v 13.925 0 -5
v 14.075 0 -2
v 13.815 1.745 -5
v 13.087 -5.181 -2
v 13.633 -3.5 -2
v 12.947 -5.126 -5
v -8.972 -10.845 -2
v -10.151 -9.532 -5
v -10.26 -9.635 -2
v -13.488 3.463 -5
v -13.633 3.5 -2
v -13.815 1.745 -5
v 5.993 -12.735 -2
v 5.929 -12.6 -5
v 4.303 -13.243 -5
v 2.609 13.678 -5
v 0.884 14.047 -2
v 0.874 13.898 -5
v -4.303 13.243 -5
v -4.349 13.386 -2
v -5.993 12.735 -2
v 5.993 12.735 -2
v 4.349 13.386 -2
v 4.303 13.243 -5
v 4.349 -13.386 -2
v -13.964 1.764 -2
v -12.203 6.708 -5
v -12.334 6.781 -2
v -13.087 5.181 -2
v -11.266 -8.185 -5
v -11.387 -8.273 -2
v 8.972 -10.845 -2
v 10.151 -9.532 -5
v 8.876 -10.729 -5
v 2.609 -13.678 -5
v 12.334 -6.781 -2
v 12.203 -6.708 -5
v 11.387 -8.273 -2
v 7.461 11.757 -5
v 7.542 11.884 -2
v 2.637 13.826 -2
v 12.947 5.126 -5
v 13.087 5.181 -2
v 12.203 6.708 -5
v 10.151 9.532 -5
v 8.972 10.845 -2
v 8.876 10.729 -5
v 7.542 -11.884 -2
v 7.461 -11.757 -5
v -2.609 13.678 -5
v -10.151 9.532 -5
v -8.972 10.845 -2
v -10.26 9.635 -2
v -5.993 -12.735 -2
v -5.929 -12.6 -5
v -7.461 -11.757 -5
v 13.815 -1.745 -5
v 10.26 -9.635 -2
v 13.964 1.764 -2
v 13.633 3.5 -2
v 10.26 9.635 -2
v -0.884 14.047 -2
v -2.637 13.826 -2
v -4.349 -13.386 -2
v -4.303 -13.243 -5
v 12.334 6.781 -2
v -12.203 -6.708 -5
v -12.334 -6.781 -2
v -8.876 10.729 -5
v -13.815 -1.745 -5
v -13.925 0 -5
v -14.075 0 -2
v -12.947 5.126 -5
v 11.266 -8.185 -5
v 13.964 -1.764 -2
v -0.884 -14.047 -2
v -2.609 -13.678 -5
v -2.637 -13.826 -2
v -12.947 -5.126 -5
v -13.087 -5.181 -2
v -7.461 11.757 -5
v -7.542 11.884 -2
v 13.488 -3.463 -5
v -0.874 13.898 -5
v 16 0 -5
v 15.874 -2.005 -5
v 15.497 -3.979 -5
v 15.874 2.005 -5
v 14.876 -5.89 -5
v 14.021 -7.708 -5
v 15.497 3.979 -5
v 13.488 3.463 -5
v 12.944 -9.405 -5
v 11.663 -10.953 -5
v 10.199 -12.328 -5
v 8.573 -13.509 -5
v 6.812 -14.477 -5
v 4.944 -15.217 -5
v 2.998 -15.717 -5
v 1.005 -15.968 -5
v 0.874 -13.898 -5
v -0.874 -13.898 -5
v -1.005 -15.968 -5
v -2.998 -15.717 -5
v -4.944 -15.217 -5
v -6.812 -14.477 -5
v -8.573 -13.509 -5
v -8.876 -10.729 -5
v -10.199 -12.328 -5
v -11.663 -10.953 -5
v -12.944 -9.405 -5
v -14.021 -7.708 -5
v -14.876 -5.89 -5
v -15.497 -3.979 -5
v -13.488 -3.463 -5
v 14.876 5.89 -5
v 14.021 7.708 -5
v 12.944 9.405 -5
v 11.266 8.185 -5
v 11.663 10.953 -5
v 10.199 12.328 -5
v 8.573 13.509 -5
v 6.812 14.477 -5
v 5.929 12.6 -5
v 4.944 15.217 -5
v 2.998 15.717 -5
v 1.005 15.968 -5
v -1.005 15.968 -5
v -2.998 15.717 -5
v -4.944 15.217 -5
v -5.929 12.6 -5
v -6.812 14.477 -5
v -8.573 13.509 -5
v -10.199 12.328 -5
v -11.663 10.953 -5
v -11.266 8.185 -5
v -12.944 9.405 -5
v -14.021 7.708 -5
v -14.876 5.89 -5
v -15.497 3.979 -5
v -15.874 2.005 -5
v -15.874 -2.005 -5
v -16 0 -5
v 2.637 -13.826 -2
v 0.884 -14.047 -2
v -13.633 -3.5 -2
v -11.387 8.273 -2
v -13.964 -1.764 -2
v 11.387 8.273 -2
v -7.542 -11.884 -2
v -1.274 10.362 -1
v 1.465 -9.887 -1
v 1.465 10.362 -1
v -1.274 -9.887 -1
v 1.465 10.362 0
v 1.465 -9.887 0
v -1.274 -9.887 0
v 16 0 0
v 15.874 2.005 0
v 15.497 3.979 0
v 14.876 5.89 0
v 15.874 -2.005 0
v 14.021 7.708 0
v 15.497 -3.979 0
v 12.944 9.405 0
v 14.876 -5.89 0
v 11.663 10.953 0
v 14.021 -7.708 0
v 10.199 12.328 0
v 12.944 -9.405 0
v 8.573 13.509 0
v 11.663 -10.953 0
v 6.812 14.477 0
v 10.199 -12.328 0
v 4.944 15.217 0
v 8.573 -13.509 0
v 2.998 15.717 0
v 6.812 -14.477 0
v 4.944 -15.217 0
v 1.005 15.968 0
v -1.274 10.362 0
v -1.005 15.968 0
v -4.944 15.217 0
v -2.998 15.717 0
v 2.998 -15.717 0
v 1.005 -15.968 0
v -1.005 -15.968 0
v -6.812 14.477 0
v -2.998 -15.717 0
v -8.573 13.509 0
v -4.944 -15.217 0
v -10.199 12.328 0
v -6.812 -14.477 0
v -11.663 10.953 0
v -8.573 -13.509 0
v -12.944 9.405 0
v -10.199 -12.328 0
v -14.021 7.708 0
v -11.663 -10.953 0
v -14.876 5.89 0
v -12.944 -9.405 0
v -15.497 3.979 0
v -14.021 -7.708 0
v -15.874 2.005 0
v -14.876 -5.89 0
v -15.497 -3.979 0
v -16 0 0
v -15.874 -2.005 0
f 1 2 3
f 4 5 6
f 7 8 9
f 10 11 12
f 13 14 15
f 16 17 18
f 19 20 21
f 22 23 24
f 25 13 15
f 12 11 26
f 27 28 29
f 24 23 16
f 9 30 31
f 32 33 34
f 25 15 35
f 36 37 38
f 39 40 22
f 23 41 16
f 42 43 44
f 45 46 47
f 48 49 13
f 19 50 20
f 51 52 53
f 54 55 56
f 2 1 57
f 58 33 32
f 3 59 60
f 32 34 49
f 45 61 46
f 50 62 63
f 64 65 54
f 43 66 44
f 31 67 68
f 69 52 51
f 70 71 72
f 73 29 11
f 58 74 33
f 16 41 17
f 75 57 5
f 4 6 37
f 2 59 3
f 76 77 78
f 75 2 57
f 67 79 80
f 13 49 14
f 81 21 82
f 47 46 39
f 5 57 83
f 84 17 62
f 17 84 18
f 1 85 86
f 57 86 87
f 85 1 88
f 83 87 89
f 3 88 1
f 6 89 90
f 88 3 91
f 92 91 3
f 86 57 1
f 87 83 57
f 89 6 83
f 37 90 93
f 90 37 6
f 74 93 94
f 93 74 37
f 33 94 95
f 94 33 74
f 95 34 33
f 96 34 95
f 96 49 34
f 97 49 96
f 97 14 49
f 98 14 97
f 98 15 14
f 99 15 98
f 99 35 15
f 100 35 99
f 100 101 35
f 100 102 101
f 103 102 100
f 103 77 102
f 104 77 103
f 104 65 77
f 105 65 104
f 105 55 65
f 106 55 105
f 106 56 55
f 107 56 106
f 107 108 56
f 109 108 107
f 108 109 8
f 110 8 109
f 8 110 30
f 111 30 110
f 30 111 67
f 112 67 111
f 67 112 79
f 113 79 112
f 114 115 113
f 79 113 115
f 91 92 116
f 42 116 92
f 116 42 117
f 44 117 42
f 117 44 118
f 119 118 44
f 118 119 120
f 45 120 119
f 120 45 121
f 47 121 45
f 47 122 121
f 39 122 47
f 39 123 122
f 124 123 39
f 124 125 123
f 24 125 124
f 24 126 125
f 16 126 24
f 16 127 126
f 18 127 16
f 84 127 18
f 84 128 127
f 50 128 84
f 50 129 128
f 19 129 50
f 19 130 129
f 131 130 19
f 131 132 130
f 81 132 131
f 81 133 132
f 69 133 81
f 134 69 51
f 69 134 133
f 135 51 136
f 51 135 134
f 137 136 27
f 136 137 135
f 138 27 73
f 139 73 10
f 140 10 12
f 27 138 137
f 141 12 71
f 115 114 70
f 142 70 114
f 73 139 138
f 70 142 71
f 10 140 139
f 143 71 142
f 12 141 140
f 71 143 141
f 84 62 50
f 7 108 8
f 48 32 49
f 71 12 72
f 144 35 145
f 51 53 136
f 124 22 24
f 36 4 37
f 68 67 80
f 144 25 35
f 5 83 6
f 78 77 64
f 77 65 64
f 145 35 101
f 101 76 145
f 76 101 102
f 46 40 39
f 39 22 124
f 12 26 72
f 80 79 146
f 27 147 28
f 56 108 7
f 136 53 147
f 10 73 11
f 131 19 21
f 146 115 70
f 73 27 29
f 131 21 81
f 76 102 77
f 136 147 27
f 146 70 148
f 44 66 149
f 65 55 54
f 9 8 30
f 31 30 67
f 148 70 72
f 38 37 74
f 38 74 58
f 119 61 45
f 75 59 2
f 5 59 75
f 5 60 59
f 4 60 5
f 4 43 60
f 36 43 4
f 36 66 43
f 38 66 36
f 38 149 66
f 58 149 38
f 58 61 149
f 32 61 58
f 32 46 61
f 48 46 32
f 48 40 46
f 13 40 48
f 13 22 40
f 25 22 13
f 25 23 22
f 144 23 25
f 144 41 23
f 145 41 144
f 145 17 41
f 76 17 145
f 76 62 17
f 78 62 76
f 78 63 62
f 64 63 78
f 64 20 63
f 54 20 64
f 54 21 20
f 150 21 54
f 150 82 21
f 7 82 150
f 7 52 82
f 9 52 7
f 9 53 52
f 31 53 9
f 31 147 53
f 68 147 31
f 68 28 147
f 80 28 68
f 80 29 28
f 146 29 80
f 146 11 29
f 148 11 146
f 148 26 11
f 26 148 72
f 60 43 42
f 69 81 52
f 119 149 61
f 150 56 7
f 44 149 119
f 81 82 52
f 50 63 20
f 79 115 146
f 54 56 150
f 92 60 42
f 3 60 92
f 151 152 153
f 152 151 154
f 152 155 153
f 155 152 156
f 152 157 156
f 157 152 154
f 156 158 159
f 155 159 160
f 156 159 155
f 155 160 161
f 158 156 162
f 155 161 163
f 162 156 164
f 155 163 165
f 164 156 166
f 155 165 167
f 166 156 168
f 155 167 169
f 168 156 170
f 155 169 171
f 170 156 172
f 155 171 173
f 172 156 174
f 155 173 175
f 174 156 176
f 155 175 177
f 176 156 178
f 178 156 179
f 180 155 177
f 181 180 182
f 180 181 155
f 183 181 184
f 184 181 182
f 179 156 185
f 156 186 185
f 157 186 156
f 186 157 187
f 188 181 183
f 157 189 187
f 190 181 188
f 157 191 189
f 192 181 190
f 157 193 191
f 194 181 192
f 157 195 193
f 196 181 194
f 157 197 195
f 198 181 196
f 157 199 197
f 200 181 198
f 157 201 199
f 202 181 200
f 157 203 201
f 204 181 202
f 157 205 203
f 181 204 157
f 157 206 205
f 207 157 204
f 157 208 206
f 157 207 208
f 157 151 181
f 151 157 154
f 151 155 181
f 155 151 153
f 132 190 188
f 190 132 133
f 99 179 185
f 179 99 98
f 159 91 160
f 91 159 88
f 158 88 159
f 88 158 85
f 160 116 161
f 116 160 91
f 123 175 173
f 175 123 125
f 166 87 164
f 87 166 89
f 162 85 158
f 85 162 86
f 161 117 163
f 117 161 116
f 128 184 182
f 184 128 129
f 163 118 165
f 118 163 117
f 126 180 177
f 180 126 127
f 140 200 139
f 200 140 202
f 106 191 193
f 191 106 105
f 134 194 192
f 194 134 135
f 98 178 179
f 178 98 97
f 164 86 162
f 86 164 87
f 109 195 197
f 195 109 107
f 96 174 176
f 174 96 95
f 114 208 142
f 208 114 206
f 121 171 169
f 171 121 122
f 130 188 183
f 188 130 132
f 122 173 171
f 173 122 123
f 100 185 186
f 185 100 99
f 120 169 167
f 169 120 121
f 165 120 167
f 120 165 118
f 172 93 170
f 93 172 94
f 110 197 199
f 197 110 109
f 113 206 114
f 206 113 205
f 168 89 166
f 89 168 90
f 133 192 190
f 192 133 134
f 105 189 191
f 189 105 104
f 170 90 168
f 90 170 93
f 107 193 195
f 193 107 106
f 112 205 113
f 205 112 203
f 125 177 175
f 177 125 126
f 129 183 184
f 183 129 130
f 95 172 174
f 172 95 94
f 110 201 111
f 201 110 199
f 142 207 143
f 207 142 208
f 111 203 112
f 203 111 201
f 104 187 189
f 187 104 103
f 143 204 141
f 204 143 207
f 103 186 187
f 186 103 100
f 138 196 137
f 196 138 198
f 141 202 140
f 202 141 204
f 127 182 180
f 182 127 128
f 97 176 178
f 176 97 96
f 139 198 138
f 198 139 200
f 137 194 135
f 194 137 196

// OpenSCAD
$fn = 50;


difference() {
	union() {
		translate(v = [0, 0, -5.0000000000]) {
			cylinder(h = 5, r = 16.0000000000);
		}
	}
	union() {
		#translate(v = [0, 0, -5.0000000000]) {
			cylinder(h = 3, r1 = 13.9250000000, r2 = 14.0750000000);
		}
		translate(v = [0, 0, -1]) {
			linear_extrude(height = 1) {
				text(font = "Impact", halign = "center", size = 20, text = "I", valign = "center");
			}
		}
	}
}
